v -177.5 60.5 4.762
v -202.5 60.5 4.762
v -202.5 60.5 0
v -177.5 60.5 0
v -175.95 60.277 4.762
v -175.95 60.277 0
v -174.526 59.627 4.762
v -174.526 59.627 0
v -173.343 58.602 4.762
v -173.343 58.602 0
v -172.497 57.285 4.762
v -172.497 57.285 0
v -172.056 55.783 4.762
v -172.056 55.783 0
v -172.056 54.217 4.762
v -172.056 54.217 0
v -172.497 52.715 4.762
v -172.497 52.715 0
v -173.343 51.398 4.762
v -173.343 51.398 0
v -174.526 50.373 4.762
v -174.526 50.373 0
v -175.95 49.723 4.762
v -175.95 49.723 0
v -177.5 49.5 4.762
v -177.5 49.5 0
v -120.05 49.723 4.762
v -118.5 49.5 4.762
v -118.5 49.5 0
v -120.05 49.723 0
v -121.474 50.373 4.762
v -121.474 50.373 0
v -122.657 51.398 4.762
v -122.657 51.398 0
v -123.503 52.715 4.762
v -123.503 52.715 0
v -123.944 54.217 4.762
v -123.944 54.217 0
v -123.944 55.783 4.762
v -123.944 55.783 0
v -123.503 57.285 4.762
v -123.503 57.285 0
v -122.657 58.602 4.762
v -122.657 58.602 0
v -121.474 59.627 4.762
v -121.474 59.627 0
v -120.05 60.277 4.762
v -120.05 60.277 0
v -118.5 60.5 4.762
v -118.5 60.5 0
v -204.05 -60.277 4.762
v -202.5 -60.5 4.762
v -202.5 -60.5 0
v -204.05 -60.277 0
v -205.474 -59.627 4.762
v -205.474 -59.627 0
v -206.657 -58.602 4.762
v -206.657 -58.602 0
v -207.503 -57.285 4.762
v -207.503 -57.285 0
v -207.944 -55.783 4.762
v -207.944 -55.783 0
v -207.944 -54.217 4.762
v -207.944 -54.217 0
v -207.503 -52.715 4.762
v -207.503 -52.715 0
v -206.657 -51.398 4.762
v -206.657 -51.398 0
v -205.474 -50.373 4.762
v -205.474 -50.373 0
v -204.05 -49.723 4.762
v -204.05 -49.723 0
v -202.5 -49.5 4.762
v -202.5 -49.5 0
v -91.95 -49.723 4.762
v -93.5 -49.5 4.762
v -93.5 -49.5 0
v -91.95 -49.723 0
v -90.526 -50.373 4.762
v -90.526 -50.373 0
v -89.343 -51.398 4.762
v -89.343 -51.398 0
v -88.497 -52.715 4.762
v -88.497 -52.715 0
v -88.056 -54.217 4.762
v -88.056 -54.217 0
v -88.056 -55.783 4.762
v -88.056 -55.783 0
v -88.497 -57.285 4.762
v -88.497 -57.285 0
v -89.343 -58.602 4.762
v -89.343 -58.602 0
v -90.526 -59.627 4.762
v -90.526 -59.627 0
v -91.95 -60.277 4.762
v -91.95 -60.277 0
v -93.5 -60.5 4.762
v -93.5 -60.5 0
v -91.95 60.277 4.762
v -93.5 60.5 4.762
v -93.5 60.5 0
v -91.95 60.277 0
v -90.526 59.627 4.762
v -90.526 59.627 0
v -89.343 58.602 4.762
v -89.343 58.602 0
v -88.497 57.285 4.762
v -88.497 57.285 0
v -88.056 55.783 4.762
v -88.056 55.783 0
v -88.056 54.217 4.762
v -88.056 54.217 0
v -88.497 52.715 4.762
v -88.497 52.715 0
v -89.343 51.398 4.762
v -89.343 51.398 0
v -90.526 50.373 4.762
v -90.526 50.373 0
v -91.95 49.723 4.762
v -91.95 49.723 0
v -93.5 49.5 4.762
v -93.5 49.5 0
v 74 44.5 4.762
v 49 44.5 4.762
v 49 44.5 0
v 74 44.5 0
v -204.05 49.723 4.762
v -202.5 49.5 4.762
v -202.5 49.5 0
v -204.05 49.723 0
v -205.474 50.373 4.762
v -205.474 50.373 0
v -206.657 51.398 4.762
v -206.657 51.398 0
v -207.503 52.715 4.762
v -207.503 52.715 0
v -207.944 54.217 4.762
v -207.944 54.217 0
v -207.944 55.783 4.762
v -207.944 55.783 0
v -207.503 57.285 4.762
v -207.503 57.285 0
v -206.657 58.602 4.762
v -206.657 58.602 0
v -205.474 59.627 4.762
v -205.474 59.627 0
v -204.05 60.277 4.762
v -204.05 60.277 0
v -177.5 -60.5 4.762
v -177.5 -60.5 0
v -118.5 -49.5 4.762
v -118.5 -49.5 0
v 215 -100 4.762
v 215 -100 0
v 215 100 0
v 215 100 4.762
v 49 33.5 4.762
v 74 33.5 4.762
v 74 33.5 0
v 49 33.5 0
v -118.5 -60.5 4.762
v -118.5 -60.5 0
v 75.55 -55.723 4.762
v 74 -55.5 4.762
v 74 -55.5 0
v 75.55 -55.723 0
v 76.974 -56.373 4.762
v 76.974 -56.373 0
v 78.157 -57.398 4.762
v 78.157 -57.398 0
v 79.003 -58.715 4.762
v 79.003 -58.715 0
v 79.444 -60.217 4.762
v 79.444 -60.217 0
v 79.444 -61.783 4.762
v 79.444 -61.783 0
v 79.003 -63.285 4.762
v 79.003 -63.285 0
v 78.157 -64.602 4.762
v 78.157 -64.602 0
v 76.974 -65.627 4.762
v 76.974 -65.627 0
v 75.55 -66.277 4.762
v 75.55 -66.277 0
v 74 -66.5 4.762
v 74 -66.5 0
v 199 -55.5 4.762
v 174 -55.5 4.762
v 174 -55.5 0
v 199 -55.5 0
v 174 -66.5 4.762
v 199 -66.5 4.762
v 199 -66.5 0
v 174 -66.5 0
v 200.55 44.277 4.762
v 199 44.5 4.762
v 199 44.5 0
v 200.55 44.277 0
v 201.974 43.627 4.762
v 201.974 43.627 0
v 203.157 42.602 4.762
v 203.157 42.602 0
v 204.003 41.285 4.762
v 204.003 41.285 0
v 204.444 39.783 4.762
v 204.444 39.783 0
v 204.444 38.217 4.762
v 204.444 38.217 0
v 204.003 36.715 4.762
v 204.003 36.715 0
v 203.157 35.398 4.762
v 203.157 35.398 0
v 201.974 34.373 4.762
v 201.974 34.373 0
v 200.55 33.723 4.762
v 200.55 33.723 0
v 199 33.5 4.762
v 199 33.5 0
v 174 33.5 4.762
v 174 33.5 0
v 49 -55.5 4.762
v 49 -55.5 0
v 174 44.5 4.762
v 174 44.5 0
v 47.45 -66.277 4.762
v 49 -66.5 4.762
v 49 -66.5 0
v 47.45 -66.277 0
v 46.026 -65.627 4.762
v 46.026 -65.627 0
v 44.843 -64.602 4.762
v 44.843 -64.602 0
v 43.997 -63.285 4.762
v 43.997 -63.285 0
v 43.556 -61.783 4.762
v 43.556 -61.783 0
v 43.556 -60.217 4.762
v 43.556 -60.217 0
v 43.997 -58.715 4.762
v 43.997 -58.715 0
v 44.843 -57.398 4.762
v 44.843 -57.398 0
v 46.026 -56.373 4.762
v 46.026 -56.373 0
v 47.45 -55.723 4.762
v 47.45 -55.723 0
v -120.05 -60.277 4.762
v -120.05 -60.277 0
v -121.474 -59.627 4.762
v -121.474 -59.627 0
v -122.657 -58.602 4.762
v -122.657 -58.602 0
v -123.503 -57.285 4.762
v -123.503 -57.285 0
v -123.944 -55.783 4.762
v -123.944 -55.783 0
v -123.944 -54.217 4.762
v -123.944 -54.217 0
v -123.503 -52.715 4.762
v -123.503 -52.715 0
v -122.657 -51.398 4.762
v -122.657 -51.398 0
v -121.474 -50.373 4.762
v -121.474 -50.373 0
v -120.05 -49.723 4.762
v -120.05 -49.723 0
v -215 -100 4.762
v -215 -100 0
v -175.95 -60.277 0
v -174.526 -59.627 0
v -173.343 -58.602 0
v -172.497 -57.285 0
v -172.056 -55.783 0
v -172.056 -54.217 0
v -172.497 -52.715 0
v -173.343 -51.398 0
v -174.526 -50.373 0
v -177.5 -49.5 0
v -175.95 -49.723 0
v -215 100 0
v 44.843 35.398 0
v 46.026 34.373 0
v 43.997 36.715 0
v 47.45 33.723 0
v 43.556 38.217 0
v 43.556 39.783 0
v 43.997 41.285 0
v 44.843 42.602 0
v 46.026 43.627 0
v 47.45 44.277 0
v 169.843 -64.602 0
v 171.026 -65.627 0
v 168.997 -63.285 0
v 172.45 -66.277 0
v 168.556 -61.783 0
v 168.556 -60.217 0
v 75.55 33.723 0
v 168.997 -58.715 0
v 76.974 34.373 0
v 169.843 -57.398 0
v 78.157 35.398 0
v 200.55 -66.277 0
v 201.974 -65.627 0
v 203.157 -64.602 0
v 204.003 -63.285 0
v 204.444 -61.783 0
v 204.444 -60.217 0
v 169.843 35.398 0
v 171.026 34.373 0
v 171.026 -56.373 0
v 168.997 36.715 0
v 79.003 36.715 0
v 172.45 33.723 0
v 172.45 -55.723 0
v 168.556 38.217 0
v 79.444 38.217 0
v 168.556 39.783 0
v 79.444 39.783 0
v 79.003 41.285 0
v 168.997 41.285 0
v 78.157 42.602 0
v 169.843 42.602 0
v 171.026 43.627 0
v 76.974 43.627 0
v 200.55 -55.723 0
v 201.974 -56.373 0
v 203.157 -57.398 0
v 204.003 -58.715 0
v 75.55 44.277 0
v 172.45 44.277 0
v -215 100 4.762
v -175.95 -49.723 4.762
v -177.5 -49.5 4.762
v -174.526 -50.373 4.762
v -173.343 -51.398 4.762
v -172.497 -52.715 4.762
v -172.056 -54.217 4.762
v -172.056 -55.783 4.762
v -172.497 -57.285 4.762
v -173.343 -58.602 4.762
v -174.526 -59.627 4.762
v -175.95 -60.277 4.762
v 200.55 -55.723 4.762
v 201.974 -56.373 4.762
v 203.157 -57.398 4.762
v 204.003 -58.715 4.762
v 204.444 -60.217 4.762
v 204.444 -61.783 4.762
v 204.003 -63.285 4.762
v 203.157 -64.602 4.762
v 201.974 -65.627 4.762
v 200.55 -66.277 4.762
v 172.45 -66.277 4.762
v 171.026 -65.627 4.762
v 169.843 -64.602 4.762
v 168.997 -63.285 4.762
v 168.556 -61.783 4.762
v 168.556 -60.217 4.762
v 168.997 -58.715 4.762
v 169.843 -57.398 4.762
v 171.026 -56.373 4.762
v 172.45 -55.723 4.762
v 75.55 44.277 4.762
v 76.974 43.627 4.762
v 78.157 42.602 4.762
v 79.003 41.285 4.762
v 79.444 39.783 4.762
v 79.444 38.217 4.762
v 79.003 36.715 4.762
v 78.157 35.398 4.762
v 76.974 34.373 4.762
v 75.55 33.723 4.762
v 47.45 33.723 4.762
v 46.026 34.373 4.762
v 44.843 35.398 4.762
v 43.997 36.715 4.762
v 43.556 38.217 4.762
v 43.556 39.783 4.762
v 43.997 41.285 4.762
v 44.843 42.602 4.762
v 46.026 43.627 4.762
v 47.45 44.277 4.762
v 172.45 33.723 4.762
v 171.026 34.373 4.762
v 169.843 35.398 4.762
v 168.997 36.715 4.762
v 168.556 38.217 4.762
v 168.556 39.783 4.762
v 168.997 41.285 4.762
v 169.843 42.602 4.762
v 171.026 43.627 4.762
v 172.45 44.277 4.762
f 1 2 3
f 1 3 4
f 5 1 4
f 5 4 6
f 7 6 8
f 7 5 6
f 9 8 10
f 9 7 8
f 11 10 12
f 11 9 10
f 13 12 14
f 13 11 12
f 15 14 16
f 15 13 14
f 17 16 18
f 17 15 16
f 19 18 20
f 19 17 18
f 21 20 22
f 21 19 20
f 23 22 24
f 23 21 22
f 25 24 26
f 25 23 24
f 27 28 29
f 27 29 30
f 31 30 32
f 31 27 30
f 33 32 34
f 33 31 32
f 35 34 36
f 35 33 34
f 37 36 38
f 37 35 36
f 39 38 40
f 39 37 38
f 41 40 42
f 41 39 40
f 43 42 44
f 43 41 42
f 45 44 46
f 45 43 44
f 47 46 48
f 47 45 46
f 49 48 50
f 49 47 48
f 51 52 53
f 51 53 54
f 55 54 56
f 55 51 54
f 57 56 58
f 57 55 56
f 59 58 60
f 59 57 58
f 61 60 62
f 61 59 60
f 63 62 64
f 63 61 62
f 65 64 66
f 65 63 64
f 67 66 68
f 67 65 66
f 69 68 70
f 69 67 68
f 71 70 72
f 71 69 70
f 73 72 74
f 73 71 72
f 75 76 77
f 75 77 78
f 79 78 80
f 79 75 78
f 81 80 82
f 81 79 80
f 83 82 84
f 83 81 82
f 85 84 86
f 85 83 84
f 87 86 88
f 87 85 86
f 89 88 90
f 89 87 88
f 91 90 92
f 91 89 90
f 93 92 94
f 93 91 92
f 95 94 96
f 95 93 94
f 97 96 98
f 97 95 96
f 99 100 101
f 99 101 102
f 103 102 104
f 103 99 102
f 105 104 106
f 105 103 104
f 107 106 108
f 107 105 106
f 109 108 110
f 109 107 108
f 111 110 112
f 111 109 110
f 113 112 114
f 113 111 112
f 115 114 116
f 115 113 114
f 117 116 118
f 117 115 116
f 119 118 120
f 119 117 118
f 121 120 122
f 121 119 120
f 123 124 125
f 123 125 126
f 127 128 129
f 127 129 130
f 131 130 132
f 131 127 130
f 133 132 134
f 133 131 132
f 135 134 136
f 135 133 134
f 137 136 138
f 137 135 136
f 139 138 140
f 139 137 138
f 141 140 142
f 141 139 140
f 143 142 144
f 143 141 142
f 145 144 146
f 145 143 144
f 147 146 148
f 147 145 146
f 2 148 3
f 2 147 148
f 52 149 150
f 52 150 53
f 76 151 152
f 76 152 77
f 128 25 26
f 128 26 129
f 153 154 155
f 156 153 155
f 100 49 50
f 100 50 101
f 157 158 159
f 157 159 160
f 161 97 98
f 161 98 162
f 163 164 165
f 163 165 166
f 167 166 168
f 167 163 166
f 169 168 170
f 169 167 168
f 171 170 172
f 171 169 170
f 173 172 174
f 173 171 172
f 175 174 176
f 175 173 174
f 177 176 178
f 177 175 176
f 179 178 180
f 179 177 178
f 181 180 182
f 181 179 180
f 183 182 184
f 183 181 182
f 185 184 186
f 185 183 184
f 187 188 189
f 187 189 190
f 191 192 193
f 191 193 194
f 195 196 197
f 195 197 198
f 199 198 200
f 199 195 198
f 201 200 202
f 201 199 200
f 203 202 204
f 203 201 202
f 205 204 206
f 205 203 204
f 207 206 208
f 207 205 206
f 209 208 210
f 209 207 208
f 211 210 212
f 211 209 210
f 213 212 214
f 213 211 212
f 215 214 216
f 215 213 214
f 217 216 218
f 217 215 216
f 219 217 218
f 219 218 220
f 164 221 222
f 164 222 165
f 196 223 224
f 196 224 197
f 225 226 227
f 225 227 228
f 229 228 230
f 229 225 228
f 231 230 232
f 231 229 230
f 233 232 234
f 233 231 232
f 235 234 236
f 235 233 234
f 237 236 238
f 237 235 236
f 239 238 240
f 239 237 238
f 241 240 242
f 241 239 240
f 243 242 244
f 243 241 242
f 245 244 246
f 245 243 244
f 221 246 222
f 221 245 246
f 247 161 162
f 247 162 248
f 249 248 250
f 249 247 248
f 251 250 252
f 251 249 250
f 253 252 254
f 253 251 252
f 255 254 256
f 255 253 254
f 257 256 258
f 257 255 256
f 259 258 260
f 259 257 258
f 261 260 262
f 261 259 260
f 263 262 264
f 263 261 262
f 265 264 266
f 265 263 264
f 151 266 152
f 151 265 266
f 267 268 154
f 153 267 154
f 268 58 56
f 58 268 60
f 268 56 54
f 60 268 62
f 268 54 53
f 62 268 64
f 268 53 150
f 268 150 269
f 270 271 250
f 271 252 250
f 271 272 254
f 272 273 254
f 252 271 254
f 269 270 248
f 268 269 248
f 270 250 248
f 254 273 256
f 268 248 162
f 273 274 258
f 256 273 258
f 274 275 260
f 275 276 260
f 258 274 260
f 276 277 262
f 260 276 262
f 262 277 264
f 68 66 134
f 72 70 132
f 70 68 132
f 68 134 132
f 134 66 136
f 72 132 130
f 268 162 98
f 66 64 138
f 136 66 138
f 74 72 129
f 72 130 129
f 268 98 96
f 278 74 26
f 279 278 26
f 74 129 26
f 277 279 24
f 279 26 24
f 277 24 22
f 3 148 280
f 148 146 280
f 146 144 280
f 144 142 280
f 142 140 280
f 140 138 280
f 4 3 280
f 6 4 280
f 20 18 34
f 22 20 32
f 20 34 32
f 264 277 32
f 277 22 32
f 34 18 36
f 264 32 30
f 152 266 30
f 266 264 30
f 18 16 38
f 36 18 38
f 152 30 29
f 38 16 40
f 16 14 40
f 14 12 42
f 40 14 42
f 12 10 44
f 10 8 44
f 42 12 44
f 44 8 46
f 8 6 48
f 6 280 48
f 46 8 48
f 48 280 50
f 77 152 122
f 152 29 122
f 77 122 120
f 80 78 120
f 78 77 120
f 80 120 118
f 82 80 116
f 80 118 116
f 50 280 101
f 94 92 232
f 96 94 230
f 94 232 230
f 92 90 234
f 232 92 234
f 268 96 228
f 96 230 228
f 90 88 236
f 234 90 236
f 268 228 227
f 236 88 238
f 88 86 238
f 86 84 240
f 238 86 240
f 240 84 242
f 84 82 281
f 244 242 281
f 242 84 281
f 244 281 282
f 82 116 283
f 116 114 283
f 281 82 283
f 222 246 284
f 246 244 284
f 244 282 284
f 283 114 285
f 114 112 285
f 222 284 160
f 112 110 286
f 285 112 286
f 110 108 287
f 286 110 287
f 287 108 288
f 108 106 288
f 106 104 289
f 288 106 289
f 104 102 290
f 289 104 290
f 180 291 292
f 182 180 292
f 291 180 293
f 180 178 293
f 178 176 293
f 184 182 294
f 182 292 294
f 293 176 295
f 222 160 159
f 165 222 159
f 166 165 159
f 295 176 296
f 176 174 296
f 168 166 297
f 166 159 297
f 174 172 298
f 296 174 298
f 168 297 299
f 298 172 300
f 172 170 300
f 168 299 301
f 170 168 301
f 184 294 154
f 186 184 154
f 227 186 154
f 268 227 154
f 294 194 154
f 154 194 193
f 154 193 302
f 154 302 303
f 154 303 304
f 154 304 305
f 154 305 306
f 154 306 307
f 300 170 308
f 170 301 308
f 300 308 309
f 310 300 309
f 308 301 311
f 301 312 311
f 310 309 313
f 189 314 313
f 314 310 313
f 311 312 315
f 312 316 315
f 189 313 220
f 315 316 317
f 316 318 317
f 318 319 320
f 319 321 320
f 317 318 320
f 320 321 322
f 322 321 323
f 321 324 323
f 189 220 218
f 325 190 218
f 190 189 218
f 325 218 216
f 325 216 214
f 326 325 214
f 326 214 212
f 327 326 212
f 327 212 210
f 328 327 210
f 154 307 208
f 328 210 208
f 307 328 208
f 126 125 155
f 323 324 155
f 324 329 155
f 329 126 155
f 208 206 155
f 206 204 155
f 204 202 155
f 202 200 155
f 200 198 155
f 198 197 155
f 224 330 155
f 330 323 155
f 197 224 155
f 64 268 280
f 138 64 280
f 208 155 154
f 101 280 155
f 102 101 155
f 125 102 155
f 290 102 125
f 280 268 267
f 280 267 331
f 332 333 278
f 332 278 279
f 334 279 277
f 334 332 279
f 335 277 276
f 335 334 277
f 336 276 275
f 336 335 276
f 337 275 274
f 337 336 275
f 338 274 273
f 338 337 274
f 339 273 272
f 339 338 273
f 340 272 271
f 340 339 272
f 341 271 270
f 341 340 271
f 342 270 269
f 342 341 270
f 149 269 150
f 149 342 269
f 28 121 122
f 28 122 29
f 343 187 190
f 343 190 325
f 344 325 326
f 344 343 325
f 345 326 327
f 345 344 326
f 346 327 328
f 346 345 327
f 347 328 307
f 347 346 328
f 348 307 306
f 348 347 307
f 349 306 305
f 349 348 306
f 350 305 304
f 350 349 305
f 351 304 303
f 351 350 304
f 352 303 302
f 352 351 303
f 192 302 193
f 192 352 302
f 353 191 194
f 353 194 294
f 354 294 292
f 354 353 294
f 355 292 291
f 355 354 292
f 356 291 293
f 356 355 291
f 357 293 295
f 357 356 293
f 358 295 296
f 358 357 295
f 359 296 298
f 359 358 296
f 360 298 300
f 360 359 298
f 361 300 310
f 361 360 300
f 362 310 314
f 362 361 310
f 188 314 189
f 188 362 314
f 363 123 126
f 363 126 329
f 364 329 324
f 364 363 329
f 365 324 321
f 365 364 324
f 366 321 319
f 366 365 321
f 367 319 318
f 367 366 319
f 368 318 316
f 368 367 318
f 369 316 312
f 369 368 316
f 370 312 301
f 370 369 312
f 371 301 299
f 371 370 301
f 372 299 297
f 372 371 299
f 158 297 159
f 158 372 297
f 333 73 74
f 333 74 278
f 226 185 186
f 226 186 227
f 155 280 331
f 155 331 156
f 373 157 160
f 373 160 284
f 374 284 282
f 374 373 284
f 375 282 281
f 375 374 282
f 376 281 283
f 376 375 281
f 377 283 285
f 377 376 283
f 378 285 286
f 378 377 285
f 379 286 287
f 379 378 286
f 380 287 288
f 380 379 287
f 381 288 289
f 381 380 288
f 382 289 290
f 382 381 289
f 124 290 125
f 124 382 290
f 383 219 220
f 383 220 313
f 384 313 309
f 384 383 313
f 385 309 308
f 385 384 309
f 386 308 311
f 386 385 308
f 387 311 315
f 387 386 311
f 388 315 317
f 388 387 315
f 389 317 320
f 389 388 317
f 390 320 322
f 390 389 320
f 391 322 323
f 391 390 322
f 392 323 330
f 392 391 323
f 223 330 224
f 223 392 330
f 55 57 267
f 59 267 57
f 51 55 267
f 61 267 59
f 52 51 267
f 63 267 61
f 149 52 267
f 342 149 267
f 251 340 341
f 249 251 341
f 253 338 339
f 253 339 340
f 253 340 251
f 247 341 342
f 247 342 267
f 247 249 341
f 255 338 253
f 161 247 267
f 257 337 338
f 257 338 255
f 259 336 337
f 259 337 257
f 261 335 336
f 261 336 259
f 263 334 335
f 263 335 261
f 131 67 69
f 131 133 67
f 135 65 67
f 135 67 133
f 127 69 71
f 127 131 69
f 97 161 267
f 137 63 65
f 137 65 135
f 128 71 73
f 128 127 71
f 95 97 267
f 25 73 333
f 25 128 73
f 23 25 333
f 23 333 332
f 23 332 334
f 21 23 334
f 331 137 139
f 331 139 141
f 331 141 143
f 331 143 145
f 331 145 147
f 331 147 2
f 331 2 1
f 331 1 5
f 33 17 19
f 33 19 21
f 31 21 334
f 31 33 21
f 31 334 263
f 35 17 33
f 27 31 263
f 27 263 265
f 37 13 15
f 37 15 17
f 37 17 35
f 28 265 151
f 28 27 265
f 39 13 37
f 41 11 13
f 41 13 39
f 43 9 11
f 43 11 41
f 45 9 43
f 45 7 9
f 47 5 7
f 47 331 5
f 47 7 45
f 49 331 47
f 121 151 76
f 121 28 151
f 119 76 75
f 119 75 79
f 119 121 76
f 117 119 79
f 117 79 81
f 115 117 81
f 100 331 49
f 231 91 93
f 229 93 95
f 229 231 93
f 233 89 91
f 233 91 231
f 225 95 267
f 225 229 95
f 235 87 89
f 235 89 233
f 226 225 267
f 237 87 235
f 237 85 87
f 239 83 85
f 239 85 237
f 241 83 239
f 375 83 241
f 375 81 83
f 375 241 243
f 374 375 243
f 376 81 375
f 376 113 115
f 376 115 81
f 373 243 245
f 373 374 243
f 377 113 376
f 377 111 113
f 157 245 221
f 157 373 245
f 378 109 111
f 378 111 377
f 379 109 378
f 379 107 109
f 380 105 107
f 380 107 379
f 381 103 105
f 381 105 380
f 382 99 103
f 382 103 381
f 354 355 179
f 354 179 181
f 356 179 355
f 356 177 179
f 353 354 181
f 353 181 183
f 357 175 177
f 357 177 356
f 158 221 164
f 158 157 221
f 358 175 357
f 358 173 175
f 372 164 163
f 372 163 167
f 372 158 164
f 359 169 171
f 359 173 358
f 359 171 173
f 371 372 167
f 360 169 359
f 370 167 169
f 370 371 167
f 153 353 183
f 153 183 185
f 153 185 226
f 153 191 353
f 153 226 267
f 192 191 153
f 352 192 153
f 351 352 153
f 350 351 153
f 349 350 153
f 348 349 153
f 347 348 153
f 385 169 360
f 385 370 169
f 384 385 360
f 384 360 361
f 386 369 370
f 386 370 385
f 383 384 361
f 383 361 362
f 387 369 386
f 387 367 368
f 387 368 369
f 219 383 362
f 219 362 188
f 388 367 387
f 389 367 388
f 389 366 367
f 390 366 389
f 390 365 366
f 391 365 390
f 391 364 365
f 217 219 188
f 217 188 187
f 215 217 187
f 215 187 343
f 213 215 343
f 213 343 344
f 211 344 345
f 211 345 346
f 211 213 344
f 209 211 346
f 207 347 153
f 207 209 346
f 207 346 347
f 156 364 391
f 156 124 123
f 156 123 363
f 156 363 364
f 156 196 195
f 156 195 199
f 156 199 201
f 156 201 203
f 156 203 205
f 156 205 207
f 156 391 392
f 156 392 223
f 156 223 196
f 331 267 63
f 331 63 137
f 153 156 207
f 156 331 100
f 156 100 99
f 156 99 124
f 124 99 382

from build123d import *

# Parameters (mm, degrees)
ESBO_O1_W                = 430
ESBO_O1_H                = 200
RESSALTO_EXTRUS_O1_DEPTH = 4.7625
CORTE_EXTRUS_O1_DEPTH    = 5.7625


with BuildPart() as part:
    # Esboço1 → Ressalto-extrusão1 (new body)
    with BuildSketch(Plane.XY):
        Rectangle(ESBO_O1_W, ESBO_O1_H)
    extrude(amount=RESSALTO_EXTRUS_O1_DEPTH)

    # Esboço2 → Corte-extrusão1 (cut, through all)
    with BuildSketch(Plane.XY.offset(4.7625)):
        with BuildLine():
            Line((-202.5, 60.5), (-177.5, 60.5))
            ThreePointArc((-177.5, 60.5), (-172, 55), (-177.5, 49.5))
            Line((-177.5, 49.5), (-202.5, 49.5))
            ThreePointArc((-202.5, 49.5), (-208, 55), (-202.5, 60.5))
        make_face()
        with BuildLine():
            Line((-93.5, 49.5), (-118.5, 49.5))
            ThreePointArc((-118.5, 49.5), (-124, 55), (-118.5, 60.5))
            Line((-118.5, 60.5), (-93.5, 60.5))
            ThreePointArc((-93.5, 60.5), (-88, 55), (-93.5, 49.5))
        make_face()
        with BuildLine():
            Line((-202.5, -49.5), (-177.5, -49.5))
            ThreePointArc((-177.5, -49.5), (-172, -55), (-177.5, -60.5))
            Line((-177.5, -60.5), (-202.5, -60.5))
            ThreePointArc((-202.5, -60.5), (-208, -55), (-202.5, -49.5))
        make_face()
        with BuildLine():
            Line((-93.5, -60.5), (-118.5, -60.5))
            ThreePointArc((-118.5, -60.5), (-124, -55), (-118.5, -49.5))
            Line((-118.5, -49.5), (-93.5, -49.5))
            ThreePointArc((-93.5, -49.5), (-88, -55), (-93.5, -60.5))
        make_face()
        with BuildLine():
            Line((49, 44.5), (74, 44.5))
            ThreePointArc((74, 44.5), (79.5, 39), (74, 33.5))
            Line((74, 33.5), (49, 33.5))
            ThreePointArc((49, 33.5), (43.5, 39), (49, 44.5))
        make_face()
        with BuildLine():
            Line((199, 33.5), (174, 33.5))
            ThreePointArc((174, 33.5), (168.5, 39), (174, 44.5))
            Line((174, 44.5), (199, 44.5))
            ThreePointArc((199, 44.5), (204.5, 39), (199, 33.5))
        make_face()
        with BuildLine():
            Line((49, -55.5), (74, -55.5))
            ThreePointArc((74, -55.5), (79.5, -61), (74, -66.5))
            Line((74, -66.5), (49, -66.5))
            ThreePointArc((49, -66.5), (43.5, -61), (49, -55.5))
        make_face()
        with BuildLine():
            Line((199, -66.5), (174, -66.5))
            ThreePointArc((174, -66.5), (168.5, -61), (174, -55.5))
            Line((174, -55.5), (199, -55.5))
            ThreePointArc((199, -55.5), (204.5, -61), (199, -66.5))
        make_face()
    extrude(amount=-CORTE_EXTRUS_O1_DEPTH, mode=Mode.SUBTRACT)


solid = part.part
